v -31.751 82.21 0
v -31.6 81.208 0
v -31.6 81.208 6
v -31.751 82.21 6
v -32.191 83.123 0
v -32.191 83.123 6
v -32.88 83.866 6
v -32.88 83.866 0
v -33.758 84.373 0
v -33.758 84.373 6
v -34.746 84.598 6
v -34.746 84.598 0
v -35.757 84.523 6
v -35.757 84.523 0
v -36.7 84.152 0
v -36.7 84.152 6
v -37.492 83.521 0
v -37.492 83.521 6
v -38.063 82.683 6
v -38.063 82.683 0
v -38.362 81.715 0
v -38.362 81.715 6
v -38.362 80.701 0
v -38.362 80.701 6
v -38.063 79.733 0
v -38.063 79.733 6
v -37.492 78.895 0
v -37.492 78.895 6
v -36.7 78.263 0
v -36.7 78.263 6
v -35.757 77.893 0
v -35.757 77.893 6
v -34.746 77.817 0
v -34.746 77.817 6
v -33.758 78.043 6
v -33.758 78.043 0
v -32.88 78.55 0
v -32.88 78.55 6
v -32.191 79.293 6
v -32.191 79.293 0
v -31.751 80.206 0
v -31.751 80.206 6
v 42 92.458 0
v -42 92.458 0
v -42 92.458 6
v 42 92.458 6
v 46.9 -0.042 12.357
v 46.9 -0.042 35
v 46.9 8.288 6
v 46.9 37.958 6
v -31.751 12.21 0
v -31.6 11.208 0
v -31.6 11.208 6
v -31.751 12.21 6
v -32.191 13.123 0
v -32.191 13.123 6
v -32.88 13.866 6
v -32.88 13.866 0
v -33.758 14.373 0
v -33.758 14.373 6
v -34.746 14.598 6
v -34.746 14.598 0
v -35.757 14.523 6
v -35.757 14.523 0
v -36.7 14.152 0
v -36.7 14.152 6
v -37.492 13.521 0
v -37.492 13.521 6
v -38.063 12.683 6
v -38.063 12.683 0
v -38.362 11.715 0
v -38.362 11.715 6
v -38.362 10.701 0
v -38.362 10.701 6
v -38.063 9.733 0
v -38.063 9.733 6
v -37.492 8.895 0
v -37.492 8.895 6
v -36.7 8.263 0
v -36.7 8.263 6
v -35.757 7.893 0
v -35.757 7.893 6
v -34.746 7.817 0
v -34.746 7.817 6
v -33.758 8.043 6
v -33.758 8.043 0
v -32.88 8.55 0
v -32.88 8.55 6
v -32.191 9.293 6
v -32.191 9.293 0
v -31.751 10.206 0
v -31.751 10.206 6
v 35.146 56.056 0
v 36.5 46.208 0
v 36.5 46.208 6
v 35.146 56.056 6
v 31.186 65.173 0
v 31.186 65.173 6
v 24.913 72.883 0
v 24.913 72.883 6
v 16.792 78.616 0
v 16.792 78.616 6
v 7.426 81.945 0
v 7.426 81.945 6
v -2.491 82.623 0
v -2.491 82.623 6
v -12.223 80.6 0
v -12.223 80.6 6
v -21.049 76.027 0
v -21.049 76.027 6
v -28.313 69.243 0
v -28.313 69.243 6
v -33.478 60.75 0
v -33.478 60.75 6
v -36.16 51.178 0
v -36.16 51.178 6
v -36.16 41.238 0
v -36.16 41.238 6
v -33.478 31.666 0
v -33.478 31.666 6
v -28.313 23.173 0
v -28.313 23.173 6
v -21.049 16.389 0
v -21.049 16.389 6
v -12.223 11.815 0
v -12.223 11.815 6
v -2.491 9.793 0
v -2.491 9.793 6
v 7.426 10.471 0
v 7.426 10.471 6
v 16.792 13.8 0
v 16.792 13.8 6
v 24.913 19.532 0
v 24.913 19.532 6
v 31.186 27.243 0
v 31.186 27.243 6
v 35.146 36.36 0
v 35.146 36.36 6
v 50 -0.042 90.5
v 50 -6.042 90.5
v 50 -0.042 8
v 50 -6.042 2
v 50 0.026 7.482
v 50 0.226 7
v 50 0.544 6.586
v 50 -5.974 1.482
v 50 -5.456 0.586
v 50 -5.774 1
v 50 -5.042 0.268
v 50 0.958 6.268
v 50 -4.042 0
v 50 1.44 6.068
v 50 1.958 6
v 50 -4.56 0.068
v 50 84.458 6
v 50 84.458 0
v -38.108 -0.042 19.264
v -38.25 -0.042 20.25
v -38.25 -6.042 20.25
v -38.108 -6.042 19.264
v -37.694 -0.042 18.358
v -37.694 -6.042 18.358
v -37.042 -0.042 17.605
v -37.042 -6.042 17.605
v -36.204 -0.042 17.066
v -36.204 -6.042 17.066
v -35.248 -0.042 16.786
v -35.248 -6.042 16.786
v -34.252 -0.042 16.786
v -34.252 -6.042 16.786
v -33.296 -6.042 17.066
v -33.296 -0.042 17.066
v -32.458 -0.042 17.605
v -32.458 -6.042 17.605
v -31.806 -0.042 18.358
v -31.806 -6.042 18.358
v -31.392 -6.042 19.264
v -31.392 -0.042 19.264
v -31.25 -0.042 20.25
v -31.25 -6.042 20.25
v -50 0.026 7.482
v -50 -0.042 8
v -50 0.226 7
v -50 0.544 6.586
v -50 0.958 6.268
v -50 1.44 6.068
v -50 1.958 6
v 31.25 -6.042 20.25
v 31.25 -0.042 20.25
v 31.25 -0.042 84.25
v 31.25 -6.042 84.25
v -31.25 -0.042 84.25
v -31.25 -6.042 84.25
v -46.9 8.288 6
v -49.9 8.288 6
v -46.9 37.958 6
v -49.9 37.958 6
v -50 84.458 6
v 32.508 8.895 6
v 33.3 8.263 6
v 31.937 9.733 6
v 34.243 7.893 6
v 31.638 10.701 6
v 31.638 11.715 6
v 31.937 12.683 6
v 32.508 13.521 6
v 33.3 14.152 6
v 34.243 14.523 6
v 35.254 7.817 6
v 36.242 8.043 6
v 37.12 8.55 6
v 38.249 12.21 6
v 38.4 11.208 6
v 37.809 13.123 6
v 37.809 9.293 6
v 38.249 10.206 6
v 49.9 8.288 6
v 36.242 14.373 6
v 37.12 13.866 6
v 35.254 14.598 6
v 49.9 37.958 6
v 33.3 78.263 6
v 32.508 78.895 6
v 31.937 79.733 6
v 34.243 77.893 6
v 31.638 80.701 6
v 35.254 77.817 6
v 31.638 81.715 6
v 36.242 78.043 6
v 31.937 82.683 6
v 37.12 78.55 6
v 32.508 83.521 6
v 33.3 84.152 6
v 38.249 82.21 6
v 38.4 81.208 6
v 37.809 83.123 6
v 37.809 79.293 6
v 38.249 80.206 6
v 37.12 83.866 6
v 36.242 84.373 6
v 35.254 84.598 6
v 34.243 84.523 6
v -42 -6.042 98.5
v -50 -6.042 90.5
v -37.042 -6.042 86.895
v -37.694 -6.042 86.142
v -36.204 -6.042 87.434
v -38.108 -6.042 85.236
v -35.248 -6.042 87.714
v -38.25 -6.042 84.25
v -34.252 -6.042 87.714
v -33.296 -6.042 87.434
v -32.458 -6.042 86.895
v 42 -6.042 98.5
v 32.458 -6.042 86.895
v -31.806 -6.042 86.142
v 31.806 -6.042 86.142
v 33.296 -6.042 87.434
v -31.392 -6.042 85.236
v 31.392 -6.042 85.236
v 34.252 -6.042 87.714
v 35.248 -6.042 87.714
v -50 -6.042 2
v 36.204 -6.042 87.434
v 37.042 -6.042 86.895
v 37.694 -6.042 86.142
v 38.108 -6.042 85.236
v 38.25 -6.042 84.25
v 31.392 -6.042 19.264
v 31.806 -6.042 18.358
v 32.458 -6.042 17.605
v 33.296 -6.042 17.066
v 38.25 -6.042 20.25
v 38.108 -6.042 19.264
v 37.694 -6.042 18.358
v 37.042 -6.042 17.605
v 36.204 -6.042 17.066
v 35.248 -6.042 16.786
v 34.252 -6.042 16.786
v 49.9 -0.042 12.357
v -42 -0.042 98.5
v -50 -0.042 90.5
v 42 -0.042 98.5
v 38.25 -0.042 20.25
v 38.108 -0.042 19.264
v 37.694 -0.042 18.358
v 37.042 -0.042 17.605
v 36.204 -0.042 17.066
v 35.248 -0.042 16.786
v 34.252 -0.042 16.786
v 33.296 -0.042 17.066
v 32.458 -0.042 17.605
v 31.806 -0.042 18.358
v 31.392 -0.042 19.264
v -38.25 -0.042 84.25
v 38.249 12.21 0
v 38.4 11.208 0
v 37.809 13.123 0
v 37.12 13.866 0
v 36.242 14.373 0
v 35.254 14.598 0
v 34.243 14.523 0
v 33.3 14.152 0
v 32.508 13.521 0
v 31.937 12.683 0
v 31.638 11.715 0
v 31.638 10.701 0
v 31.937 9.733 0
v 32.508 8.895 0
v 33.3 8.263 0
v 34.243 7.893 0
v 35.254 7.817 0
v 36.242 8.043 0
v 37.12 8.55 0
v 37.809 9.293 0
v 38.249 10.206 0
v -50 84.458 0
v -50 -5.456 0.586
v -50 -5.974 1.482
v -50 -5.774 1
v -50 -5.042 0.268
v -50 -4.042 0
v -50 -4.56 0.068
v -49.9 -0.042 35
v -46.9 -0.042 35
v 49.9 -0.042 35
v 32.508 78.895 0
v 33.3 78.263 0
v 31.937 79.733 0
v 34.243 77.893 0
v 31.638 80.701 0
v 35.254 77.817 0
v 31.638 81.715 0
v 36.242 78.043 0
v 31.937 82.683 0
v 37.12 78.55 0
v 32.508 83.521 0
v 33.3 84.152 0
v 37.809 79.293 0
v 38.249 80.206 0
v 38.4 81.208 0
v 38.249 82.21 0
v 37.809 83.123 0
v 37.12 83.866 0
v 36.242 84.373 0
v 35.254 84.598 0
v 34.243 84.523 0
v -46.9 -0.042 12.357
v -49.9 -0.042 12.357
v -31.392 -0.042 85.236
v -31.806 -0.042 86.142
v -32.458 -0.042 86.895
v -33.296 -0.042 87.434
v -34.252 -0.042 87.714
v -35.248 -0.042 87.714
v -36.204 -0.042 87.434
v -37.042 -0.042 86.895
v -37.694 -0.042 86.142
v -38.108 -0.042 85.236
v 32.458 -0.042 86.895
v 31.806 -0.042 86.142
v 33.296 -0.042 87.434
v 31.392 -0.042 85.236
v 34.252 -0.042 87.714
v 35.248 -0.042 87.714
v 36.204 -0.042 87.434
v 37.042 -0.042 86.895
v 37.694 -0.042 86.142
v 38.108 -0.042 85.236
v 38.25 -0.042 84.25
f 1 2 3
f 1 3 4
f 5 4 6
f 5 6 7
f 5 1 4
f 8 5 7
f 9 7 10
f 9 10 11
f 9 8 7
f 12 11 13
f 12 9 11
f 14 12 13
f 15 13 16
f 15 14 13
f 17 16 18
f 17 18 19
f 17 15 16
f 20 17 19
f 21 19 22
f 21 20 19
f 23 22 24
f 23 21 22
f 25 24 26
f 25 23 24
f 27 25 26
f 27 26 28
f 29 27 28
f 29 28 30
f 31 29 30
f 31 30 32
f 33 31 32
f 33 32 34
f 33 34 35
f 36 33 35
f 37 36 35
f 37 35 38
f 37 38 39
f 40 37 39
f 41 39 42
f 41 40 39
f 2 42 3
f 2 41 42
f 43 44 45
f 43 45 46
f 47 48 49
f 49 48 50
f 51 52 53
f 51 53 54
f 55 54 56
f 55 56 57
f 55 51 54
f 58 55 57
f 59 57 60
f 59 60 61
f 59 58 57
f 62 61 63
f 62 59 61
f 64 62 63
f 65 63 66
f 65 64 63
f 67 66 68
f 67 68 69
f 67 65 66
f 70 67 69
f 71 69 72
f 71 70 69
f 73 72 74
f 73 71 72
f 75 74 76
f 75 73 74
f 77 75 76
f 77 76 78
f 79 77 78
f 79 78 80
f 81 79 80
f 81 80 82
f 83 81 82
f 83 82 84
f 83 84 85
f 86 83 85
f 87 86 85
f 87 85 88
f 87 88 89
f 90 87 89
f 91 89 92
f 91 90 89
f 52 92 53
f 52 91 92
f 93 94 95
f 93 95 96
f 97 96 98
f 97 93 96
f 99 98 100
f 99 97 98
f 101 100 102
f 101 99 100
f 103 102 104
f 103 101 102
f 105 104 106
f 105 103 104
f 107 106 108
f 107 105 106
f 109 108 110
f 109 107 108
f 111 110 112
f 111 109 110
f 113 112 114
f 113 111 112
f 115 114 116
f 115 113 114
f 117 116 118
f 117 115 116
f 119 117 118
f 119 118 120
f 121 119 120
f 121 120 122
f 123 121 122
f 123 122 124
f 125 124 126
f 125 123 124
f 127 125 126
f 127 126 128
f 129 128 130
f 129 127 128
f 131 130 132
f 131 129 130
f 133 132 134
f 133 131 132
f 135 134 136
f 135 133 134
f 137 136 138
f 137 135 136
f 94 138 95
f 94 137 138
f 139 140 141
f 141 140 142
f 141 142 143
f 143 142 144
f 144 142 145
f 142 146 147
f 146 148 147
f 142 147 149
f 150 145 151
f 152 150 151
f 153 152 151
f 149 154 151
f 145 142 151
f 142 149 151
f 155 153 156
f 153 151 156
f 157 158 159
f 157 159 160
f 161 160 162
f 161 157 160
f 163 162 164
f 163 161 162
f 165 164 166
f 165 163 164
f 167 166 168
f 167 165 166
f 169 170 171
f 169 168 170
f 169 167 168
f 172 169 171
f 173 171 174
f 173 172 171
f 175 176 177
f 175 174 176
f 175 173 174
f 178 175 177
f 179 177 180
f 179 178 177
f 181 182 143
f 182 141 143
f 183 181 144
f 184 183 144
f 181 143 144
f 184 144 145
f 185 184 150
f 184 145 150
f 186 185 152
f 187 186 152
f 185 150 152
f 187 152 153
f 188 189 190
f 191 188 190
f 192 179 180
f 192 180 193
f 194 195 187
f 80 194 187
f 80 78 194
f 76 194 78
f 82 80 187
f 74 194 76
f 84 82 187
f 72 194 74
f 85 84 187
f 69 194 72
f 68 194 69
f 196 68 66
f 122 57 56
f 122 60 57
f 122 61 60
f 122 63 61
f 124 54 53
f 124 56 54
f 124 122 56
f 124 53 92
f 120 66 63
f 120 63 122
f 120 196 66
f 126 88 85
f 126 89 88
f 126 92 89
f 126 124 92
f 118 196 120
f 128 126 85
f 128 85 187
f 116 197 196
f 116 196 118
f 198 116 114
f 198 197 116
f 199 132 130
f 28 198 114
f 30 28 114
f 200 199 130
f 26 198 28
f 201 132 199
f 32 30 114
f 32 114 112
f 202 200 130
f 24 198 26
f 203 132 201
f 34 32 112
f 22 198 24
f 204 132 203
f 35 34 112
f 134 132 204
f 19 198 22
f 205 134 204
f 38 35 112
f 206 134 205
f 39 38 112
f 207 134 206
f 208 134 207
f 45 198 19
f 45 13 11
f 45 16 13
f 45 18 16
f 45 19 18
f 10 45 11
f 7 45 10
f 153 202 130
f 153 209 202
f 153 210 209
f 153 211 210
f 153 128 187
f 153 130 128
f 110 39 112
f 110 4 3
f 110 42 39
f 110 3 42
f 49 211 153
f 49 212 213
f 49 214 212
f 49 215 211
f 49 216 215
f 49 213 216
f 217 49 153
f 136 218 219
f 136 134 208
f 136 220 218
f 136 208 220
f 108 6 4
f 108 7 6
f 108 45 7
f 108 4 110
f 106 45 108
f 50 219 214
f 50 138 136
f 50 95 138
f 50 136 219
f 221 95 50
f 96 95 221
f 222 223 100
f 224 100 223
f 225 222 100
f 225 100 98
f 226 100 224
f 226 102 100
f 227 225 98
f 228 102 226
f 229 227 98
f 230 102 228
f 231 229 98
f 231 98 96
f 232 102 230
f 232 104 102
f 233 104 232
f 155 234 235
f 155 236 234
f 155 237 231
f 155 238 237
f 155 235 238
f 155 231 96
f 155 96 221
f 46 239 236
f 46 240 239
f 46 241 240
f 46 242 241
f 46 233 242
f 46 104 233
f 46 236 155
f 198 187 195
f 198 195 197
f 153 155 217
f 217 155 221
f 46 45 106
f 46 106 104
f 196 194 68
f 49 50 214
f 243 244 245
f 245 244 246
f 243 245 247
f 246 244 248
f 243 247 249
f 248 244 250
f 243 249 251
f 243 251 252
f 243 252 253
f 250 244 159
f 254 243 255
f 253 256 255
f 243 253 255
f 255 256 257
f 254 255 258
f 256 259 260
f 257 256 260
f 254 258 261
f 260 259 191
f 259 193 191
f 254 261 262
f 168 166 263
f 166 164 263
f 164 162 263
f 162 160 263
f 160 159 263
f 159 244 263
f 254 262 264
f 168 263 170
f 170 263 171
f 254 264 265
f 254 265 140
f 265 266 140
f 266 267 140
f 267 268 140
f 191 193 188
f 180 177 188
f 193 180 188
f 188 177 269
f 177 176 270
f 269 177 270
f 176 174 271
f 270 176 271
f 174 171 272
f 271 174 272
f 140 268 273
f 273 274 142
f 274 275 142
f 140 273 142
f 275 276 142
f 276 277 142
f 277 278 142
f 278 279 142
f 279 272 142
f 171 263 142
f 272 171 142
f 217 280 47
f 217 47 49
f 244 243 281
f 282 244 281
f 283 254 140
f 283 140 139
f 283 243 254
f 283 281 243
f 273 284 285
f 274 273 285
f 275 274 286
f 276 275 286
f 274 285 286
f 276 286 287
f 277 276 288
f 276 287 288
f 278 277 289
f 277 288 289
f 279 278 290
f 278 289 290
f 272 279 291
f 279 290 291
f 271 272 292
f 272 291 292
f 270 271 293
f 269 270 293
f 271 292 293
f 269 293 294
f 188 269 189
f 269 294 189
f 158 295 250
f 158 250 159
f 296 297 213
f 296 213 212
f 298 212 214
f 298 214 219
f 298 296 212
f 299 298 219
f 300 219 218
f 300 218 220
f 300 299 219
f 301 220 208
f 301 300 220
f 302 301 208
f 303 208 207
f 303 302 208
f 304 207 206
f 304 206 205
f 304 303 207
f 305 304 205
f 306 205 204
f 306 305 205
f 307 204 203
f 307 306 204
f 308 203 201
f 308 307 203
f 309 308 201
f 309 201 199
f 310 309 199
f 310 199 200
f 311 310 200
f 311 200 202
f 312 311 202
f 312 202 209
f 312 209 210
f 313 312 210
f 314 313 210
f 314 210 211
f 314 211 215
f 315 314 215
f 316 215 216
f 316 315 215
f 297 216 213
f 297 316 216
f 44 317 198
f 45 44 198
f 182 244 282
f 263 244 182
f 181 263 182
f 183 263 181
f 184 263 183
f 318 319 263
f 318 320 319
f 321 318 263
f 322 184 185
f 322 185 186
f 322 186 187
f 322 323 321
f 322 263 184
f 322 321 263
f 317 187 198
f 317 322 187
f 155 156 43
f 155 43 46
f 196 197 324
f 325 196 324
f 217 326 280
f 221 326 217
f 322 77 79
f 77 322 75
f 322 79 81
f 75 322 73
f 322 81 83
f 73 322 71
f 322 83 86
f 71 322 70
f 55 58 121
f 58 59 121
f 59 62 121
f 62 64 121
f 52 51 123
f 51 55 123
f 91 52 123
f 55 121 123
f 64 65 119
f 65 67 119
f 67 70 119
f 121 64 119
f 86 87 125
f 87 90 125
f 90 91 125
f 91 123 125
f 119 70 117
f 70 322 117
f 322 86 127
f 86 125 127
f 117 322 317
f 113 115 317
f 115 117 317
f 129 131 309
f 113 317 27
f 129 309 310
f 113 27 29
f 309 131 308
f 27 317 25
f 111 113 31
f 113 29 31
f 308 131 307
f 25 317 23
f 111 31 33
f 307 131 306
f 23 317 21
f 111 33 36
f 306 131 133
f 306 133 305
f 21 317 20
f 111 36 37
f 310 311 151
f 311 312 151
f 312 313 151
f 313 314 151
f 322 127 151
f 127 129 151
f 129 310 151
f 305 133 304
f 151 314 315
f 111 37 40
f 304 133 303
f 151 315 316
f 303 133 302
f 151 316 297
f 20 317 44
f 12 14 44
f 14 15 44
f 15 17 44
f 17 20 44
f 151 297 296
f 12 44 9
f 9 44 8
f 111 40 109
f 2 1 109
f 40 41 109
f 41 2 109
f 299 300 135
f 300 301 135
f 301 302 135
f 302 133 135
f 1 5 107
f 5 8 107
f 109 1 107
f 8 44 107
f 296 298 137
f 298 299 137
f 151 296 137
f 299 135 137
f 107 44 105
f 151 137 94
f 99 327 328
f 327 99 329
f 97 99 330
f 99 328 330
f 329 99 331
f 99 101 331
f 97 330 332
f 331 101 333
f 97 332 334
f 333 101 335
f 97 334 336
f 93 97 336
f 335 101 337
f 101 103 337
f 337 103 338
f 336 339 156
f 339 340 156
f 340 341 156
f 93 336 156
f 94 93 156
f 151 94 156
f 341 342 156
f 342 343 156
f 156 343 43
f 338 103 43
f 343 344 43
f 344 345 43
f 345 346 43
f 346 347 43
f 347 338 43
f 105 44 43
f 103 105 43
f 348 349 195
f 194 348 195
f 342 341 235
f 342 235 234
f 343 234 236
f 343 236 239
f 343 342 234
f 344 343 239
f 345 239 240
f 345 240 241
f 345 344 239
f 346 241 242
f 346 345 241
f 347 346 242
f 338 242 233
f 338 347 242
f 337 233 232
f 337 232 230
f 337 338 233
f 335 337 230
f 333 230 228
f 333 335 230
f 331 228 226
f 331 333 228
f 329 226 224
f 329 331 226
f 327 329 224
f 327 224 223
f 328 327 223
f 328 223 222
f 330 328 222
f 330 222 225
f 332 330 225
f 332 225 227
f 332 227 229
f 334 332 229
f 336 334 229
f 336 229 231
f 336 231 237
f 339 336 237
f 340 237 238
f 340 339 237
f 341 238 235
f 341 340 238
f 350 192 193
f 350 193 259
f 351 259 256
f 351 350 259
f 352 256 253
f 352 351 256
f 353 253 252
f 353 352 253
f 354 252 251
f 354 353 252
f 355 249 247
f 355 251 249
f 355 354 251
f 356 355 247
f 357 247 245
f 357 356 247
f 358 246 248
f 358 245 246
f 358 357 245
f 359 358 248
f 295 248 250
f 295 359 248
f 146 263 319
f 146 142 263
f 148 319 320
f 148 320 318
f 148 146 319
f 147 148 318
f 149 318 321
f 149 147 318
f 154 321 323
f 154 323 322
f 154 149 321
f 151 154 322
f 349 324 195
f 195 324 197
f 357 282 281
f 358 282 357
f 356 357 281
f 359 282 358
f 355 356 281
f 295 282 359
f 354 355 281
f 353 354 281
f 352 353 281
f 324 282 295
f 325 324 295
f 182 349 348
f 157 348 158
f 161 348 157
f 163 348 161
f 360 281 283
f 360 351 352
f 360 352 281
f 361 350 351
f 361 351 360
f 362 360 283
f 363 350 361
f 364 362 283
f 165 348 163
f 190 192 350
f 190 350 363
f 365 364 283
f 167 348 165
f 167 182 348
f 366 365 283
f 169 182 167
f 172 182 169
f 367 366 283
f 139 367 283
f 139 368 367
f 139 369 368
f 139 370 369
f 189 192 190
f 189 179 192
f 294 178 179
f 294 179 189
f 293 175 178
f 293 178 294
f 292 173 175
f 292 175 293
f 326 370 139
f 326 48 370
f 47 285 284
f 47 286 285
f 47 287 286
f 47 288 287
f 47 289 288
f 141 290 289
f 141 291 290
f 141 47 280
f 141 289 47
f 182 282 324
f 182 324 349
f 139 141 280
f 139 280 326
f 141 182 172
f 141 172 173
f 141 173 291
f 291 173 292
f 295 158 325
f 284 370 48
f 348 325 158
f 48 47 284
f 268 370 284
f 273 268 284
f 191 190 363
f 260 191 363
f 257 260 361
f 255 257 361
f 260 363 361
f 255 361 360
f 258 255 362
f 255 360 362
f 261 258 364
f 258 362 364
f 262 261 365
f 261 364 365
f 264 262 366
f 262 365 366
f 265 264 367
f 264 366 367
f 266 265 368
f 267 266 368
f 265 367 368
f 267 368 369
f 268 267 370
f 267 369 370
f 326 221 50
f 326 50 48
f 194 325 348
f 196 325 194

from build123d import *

# Parameters (mm, degrees)
SKETCH1_W           = 100
SKETCH1_H           = 98.5
SKETCH1_R           = 36.5
SKETCH1_R_2         = 3.4
BOSS_EXTRUDE1_DEPTH = 6
SKETCH2_W           = 100
SKETCH2_H           = 6
BOSS_EXTRUDE2_DEPTH = 92.5
CHAMFER1_SIZE       = 8
CUT_EXTRUDE1_DEPTH  = 145.078103819
BOSS_EXTRUDE3_START = -0.1
BOSS_EXTRUDE3_DEPTH = 3
BOSS_EXTRUDE4_START = -0.1
BOSS_EXTRUDE4_DEPTH = 3
FILLET1_R           = 2


with BuildPart() as part:
    # Sketch1 → Boss-Extrude1 (new body)
    with BuildSketch(Plane.XY):
        with Locations((0, 43.207953426)):
            Rectangle(SKETCH1_W, SKETCH1_H)
        with Locations((0, 46.207953426)):
            Circle(SKETCH1_R, mode=Mode.SUBTRACT)
        with Locations((-35, 81.207953426)):
            Circle(SKETCH1_R_2, mode=Mode.SUBTRACT)
        with Locations((35, 81.207953426)):
            Circle(SKETCH1_R_2, mode=Mode.SUBTRACT)
        with Locations((35, 11.207953426)):
            Circle(SKETCH1_R_2, mode=Mode.SUBTRACT)
        with Locations((-35, 11.207953426)):
            Circle(SKETCH1_R_2, mode=Mode.SUBTRACT)
    extrude(amount=BOSS_EXTRUDE1_DEPTH)

    # Sketch2 → Boss-Extrude2 (add)
    with BuildSketch(Plane.XY.offset(6)):
        with Locations((0, -3.042046574)):
            Rectangle(SKETCH2_W, SKETCH2_H)
    extrude(amount=BOSS_EXTRUDE2_DEPTH)

    # Chamfer1
    chamfer1_edges = [part.edges().sort_by_distance(p)[0] for p in [
        (-50, -3.042046574, 98.5),
        (50, -3.042046574, 98.5),
        (-50, 92.457953426, 3),
        (50, 92.457953426, 3),
    ]]
    chamfer(chamfer1_edges, length=CHAMFER1_SIZE)

    # Sketch3 → Cut-Extrude1 (cut, through all)
    with BuildSketch(Plane(origin=(0, -0.042046574, 0), x_dir=(1, 0, 0), z_dir=(0, 1, 0))):
        with BuildLine():
            Line((-38.25, -84.25), (-38.25, -20.25))
            ThreePointArc((-38.25, -20.25), (-34.75, -16.75), (-31.25, -20.25))
            Line((-31.25, -20.25), (-31.25, -84.25))
            ThreePointArc((-31.25, -84.25), (-34.75, -87.75), (-38.25, -84.25))
        make_face()
        with BuildLine():
            Line((38.25, -84.25), (38.25, -20.25))
            ThreePointArc((38.25, -20.25), (34.75, -16.75), (31.25, -20.25))
            Line((31.25, -20.25), (31.25, -84.25))
            ThreePointArc((31.25, -84.25), (34.75, -87.75), (38.25, -84.25))
        make_face()
    extrude(amount=-CUT_EXTRUDE1_DEPTH, mode=Mode.SUBTRACT)

    # Sketch4 → Boss-Extrude3 (add)
    with BuildSketch(Plane.ZY.offset(50).offset(BOSS_EXTRUDE3_START)):
        Polygon((6, 37.957953426), (35, -0.042046574), (12.357101974, -0.042046574), (6, 8.287949116), align=None)
    extrude(amount=-BOSS_EXTRUDE3_DEPTH)

    # Sketch5 → Boss-Extrude4 (add)
    with BuildSketch(Plane(origin=(50, 0, 0), x_dir=(0, 0, -1), z_dir=(1, 0, 0)).offset(BOSS_EXTRUDE4_START)):
        Polygon((-6, 8.287949116), (-6, 37.957953426), (-35, -0.042046574), (-12.357101974, -0.042046574), align=None)
    extrude(amount=-BOSS_EXTRUDE4_DEPTH)

    # Fillet1
    fillet1_edges = [part.edges().sort_by_distance(p)[0] for p in [
        (0, -0.042046574, 6),
        (0, -6.042046574, 0),
    ]]
    fillet(fillet1_edges, radius=FILLET1_R)


solid = part.part
